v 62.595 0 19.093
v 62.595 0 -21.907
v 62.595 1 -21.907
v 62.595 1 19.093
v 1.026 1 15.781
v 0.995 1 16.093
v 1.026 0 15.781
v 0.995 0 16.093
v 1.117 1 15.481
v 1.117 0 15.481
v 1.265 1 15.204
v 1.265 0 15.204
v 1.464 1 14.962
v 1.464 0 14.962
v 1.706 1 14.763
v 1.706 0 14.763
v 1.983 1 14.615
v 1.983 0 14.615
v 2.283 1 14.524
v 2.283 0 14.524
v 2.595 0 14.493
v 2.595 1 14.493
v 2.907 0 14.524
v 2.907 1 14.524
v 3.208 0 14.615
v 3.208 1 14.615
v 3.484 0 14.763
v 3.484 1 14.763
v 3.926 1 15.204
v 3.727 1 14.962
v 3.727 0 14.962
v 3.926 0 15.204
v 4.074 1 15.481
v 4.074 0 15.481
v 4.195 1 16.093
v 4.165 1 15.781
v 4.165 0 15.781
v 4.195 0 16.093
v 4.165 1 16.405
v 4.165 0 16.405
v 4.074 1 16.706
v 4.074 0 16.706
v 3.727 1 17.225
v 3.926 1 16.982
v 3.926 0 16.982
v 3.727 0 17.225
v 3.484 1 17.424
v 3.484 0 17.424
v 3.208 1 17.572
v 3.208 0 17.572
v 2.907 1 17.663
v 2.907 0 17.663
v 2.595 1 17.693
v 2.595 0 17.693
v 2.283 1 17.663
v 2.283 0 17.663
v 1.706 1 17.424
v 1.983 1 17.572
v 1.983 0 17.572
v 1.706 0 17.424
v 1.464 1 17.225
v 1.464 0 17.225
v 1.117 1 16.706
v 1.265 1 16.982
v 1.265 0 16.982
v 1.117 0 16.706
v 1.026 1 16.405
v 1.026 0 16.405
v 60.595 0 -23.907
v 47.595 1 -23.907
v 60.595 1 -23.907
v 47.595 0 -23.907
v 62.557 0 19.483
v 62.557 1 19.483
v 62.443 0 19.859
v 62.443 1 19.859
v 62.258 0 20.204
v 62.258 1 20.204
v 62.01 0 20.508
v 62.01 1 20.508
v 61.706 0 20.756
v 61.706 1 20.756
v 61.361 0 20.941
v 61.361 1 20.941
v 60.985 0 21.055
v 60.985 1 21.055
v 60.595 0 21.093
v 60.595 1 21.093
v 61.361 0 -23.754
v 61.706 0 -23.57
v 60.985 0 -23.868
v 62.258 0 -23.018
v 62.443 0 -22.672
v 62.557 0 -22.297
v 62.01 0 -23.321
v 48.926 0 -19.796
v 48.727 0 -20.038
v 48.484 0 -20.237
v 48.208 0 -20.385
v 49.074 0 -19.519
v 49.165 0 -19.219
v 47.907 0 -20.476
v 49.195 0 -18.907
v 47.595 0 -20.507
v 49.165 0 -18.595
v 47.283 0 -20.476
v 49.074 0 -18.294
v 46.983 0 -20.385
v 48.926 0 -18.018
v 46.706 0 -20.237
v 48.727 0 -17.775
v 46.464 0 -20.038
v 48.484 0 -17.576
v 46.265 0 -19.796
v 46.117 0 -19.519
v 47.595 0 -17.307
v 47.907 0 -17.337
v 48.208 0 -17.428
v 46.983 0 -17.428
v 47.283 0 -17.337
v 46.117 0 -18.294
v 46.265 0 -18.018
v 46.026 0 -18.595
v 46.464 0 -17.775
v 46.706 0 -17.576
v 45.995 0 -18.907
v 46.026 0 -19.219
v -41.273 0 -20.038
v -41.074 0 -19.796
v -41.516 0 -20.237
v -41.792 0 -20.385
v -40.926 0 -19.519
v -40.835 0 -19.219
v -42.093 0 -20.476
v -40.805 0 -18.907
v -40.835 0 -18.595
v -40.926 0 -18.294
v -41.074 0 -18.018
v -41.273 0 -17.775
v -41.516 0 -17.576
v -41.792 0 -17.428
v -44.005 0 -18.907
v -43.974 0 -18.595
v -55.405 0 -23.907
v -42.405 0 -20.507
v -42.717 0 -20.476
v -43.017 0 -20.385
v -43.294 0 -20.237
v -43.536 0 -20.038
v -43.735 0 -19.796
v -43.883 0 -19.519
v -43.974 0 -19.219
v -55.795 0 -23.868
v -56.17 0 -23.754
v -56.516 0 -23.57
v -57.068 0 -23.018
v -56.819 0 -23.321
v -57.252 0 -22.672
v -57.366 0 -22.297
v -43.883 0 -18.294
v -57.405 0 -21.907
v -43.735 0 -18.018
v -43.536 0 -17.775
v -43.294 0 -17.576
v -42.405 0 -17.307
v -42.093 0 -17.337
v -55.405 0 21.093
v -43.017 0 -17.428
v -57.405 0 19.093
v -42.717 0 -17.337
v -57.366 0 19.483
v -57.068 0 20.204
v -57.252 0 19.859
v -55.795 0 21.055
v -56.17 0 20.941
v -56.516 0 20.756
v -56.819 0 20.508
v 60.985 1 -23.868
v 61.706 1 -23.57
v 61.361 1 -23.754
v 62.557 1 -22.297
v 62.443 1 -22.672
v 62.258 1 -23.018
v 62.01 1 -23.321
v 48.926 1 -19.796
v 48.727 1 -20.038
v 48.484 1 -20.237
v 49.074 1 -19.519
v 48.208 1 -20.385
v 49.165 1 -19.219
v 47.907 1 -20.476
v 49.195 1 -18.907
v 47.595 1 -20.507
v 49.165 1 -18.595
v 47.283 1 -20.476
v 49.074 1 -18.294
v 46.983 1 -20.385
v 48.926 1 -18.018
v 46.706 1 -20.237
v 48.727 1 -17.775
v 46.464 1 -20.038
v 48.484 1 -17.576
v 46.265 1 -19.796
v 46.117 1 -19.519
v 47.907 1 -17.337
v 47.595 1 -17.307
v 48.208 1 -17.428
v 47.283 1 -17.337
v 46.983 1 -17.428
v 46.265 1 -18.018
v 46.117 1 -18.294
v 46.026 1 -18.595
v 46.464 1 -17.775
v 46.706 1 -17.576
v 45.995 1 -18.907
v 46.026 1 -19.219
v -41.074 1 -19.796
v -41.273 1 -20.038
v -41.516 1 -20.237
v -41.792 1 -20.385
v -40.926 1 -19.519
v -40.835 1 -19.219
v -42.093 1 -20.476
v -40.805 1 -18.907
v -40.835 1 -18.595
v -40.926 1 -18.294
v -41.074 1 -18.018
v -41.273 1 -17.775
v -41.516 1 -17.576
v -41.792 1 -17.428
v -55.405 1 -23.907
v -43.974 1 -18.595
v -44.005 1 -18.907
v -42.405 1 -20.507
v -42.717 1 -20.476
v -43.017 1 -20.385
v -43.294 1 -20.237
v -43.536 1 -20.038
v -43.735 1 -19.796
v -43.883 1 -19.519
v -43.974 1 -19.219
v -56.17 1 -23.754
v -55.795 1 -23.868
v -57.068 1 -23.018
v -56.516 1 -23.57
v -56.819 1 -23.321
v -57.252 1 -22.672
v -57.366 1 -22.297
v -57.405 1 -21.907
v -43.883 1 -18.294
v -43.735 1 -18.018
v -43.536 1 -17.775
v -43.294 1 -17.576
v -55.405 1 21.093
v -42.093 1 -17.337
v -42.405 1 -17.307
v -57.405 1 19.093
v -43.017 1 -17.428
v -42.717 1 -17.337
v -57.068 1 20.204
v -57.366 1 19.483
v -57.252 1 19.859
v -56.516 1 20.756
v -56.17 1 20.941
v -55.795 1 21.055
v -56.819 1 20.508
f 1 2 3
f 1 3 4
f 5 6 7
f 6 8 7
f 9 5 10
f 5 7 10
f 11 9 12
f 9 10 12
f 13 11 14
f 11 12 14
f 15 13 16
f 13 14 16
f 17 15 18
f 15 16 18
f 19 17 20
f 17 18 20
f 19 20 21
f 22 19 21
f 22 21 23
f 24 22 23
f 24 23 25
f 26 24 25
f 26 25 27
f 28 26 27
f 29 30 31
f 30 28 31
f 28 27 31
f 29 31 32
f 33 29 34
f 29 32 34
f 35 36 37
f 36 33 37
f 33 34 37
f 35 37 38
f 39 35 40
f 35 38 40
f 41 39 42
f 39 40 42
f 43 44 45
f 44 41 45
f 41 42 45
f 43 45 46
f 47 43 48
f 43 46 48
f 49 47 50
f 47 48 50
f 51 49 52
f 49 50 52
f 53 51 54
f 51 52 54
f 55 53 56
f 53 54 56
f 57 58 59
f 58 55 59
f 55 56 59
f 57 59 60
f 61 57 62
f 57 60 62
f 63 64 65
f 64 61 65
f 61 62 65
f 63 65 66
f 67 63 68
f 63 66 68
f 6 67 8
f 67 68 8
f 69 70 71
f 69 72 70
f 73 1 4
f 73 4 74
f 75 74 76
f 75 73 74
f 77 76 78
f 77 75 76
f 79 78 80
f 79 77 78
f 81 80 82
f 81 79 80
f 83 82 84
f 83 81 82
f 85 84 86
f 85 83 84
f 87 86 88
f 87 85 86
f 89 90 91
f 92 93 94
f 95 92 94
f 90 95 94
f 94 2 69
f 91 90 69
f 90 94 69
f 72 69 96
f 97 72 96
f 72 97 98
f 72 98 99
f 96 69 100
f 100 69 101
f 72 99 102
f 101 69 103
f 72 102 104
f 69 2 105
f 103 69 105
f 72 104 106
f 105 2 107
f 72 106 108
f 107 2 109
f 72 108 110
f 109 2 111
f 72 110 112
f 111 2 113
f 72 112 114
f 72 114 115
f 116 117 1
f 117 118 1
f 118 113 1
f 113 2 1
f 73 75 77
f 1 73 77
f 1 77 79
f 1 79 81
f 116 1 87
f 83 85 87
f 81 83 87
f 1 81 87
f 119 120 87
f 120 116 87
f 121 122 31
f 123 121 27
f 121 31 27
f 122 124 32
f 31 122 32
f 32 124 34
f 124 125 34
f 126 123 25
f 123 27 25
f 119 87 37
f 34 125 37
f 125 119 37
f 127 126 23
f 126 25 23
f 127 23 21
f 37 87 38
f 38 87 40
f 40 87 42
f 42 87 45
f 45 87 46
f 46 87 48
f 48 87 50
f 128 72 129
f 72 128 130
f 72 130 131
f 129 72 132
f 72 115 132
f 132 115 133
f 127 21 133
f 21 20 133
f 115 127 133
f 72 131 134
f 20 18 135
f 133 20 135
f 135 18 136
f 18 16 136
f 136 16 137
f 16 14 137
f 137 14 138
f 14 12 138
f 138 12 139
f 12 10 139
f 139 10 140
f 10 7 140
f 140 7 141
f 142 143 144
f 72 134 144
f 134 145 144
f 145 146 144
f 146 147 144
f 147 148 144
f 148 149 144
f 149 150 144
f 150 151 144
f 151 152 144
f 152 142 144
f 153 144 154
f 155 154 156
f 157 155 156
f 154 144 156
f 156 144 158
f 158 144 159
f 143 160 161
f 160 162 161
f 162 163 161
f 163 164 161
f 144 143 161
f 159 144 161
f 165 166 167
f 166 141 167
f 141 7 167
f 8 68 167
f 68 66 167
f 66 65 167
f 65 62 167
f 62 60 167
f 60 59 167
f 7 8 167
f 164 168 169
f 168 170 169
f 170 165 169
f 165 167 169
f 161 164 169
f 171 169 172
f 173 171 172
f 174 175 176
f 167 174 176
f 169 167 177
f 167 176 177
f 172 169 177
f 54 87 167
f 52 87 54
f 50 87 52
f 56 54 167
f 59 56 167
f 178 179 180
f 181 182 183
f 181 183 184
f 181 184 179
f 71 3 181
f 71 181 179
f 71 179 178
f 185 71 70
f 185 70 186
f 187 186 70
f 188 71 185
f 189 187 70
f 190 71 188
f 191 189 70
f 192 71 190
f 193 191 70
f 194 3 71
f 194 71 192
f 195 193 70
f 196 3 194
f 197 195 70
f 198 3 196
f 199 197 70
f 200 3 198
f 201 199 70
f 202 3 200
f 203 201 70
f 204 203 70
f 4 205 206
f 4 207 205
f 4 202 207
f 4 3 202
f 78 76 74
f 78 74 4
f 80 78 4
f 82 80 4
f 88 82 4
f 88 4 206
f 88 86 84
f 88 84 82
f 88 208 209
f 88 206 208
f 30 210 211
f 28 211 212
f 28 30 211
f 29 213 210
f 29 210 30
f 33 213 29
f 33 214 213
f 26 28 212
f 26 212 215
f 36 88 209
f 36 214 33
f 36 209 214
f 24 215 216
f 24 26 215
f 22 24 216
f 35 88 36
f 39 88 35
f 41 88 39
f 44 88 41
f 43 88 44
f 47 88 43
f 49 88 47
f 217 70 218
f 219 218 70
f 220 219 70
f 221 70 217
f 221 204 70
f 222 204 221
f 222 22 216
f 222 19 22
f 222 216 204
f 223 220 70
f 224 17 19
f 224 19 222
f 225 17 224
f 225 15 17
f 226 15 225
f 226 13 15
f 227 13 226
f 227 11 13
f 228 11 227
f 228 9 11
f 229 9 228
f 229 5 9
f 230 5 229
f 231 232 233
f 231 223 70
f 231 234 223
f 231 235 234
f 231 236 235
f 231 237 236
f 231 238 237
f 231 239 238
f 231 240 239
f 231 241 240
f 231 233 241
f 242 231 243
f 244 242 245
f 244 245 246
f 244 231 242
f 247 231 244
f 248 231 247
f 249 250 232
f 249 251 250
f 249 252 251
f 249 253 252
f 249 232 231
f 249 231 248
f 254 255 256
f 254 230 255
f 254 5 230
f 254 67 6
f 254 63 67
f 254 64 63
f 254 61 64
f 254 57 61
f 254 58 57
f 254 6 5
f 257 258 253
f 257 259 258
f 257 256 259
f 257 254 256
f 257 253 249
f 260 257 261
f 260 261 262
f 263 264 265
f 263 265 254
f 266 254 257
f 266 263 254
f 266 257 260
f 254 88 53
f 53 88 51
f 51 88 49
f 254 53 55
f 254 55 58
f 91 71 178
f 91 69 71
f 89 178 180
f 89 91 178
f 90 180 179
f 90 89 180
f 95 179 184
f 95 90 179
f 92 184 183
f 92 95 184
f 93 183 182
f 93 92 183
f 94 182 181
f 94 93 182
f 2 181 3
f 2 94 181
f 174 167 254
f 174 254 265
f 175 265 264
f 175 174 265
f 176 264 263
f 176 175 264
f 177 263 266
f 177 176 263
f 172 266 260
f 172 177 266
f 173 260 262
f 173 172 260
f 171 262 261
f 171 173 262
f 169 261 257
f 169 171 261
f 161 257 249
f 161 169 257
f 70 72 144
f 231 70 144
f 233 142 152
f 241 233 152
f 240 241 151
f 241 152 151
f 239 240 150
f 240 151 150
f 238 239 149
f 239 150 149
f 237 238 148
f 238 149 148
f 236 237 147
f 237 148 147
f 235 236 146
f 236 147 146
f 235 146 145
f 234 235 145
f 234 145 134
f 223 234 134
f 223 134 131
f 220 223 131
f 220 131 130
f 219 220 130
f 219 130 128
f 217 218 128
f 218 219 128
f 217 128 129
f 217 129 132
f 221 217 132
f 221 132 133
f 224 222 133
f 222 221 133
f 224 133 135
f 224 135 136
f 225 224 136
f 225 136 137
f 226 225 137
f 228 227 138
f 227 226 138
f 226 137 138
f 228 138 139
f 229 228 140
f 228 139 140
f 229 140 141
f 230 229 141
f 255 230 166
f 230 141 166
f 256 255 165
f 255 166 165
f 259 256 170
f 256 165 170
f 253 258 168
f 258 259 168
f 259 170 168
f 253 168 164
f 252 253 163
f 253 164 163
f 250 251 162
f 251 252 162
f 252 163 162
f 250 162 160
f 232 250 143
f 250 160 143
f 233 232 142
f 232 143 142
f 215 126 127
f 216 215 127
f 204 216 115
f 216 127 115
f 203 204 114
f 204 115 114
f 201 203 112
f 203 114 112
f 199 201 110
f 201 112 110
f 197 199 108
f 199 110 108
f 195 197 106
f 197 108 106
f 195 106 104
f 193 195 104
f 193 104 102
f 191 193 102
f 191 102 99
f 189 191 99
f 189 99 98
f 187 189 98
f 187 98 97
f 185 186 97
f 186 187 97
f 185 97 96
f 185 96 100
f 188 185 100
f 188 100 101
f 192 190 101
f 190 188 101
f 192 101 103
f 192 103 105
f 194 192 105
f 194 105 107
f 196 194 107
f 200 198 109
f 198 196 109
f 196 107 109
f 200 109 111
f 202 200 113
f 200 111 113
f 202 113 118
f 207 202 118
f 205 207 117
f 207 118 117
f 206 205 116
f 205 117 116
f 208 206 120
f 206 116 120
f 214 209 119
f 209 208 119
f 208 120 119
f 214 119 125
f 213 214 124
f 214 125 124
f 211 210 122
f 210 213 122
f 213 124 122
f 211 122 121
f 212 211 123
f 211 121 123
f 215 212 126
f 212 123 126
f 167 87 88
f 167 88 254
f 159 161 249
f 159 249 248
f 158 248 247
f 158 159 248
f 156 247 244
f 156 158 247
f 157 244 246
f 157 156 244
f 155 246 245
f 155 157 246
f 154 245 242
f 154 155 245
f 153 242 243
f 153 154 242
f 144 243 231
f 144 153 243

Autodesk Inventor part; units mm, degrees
ref_plane "YZ Plane" through (0, 0, 0) normal (1, 0, 0) x (0, 1, 0)
ref_plane "XZ Plane" through (0, 0, 0) normal (0, 1, 0) x (-1, 0, 0)
ref_plane "XY Plane" through (0, 0, 0) normal (0, 0, 1) x (1, 0, 0)
sketch "Sketch1" plane through (0, 0, 0) normal (0, 1, 0) x (-1, 0, 0)
  circle A0 centre (-2.5953, 16.0933) radius 1.6
  circle A1 centre (-47.5953, -18.9067) radius 1.6
  line L0 (-47.5953, -23.9067) -> (55.4047, -23.9067)
  line L1 (-47.5953, -23.9067) -> (-60.5953, -23.9067)
  line L2 (-62.5953, -21.9067) -> (-62.5953, 19.0933)
  arc A2 (-62.5953, -21.9067) -> (-60.5953, -23.9067) centre (-60.5953, -21.9067) ccw
  line L3 (-60.5953, 21.0933) -> (55.4047, 21.0933)
  arc A3 (-60.5953, 21.0933) -> (-62.5953, 19.0933) centre (-60.5953, 19.0933) ccw
  line L4 (57.4047, 19.0933) -> (57.4047, -21.9067)
  arc A4 (57.4047, 19.0933) -> (55.4047, 21.0933) centre (55.4047, 19.0933) ccw
  arc A5 (55.4047, -23.9067) -> (57.4047, -21.9067) centre (55.4047, -21.9067) ccw
  circle A6 centre (42.4047, -18.9067) radius 1.6
  point P0 (0, 0)
extrude "Extrusion1" add sketch "Sketch1" along normal blind 1
properties part number "Veroboard"
